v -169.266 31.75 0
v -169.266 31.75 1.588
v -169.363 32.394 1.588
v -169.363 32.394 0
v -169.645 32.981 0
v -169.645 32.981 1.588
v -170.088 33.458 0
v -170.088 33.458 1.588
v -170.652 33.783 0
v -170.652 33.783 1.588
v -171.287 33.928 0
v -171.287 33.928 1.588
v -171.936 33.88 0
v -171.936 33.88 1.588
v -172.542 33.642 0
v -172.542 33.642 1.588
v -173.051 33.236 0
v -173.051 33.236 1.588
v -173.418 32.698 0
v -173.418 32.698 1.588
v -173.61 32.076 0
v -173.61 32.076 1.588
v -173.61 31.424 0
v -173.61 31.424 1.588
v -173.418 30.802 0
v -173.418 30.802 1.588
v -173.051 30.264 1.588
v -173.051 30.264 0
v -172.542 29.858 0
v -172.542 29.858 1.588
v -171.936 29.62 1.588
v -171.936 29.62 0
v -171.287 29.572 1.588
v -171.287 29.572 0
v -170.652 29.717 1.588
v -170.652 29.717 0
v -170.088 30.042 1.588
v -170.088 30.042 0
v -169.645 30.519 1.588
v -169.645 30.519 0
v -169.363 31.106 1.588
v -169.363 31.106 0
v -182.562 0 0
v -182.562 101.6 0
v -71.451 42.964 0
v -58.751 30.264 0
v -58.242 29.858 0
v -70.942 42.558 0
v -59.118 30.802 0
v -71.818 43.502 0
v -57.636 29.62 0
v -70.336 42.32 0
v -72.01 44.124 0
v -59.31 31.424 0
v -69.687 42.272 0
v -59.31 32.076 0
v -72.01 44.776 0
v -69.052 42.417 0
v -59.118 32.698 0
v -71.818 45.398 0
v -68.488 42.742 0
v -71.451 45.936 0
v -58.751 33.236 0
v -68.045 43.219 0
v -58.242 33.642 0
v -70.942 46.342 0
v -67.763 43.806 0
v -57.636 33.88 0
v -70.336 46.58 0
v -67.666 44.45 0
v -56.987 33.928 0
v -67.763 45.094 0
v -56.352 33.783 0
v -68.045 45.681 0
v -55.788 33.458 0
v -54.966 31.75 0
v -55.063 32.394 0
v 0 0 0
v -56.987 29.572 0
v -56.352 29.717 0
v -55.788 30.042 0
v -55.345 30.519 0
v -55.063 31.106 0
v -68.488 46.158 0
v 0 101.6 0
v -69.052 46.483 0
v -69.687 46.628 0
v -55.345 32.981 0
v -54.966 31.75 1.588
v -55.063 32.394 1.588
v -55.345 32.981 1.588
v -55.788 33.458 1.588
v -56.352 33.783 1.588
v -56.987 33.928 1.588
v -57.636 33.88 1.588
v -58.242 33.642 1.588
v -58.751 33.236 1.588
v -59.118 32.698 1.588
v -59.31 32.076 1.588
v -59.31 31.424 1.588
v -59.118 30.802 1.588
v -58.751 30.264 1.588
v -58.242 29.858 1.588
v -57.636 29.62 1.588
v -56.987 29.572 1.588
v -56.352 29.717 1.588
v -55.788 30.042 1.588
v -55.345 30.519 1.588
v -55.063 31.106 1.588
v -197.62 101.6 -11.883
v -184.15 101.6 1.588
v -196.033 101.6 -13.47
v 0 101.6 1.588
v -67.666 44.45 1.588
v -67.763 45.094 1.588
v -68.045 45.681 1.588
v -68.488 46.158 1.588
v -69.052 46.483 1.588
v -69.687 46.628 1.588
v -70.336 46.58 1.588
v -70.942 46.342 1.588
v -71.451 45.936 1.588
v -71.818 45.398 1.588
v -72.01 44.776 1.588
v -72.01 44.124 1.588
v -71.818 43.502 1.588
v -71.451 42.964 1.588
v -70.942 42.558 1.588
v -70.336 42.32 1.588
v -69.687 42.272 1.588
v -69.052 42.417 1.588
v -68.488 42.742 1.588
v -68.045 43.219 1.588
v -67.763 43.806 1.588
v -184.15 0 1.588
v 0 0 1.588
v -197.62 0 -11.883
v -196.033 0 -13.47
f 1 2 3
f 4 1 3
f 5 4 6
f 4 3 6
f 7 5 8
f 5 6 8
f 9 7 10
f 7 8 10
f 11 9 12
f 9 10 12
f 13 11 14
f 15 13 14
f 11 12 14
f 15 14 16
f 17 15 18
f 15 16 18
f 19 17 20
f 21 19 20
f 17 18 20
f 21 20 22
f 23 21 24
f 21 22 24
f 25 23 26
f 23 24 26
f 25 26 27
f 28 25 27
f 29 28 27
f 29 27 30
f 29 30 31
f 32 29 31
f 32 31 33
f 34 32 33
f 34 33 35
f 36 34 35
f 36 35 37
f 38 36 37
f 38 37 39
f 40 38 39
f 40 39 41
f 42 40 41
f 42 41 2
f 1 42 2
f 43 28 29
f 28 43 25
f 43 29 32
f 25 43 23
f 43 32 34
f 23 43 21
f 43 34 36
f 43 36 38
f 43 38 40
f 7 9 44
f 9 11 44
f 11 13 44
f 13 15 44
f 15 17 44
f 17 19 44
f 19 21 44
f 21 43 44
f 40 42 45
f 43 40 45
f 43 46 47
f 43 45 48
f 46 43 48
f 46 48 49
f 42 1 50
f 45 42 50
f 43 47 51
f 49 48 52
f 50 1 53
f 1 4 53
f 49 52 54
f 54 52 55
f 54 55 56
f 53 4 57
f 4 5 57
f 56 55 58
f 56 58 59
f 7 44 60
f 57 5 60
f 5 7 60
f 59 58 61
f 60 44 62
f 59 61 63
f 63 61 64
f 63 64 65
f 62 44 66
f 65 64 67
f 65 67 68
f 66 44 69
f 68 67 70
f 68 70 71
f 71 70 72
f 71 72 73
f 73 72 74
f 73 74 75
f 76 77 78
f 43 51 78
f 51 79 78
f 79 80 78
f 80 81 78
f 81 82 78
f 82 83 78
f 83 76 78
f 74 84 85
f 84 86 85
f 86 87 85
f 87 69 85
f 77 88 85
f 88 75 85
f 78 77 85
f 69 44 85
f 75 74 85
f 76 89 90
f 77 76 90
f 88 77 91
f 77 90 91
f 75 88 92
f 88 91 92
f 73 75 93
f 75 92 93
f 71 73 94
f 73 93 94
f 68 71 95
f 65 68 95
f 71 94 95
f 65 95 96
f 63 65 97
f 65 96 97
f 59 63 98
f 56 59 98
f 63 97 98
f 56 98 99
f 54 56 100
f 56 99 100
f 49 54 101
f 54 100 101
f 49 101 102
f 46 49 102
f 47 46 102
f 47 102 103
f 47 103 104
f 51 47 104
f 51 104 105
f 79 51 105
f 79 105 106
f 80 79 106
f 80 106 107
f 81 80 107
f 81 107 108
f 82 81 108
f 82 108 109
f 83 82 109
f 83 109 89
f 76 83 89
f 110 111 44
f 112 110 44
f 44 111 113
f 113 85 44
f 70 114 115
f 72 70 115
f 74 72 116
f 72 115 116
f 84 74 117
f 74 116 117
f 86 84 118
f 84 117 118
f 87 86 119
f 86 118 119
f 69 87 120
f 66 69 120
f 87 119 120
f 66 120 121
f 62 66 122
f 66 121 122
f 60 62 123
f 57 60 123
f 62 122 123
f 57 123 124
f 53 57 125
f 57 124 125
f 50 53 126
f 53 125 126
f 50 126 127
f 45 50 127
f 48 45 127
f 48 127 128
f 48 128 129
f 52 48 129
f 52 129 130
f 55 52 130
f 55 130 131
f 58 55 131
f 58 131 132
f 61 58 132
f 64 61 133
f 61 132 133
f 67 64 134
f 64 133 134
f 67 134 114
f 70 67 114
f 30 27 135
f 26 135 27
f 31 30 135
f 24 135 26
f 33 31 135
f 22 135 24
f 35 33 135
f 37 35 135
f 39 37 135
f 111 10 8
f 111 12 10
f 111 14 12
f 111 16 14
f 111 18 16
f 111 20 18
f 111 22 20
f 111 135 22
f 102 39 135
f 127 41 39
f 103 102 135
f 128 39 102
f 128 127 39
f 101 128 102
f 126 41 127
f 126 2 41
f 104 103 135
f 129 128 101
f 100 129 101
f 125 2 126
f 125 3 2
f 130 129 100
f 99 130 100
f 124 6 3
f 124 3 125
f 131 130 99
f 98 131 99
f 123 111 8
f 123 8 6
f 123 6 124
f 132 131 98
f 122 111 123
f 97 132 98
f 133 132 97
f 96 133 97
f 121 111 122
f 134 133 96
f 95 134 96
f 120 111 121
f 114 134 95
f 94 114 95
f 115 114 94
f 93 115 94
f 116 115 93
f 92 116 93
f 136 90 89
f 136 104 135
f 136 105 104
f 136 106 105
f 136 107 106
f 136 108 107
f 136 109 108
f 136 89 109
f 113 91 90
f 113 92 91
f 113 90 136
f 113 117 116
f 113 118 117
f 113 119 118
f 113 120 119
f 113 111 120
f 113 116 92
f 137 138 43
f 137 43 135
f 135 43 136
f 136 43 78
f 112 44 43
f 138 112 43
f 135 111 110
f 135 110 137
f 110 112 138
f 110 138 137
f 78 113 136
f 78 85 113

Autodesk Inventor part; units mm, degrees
ref_plane "YZ Plane" through (0, 0, 0) normal (1, 0, 0) x (0, 1, 0)
ref_plane "XZ Plane" through (0, 0, 0) normal (0, 1, 0) x (-1, 0, 0)
ref_plane "XY Plane" through (0, 0, 0) normal (0, 0, 1) x (1, 0, 0)
sketch "Sketch1" plane through (0, 0, 0) normal (0, 0, 1) x (1, 0, 0)
  line L0 (0, 0) -> (-184.15, 0)
  line L1 (-184.15, 0) -> (-184.15, 101.6)
  line L2 (-184.15, 101.6) -> (0, 101.6)
  line L3 (0, 101.6) -> (0, 0)
  dimension "d0" = 184.15
  dimension "d1" = 101.6
extrude "Extrusion1" add sketch "Sketch1" along normal blind 1.5875
chamfer "Chamfer1" distance 1.5875 angle 45 1 edges at (-184.15, 50.8, 0)
sketch "Sketch2" plane through (-184.15, 0, 1.5875) normal (-0.7071, 0, -0.7071) x (-0.7071, 0, 0.7071)
  line L0 (0, 101.6) -> (0, 0) projected
  line L1 (-2.2451, 101.6) -> (-2.2451, 0) projected
  line L2 (0, 101.6) -> (-2.2451, 101.6) projected
  line L3 (-2.2451, 0) -> (0, 0) projected
  point P0 (-131.3362, 0)
extrude "Extrusion2" add sketch "Sketch2" along normal blind 19.05
sketch "Sketch3" plane through (0, 0, 1.5875) normal (0, 0, 1) x (1, 0, 0)
  circle A0 centre (-57.15, 31.75) radius 2.1844
  line L0 (-184.15, 0) -> (0, 0) projected
  line L1 (-184.15, 101.6) -> (-184.15, 0) projected
  circle A1 centre (-69.85, 44.45) radius 2.1844
  circle A2 centre (-171.45, 31.75) radius 2.1844
  point P0 (-231.8428, 57.2075)
  dimension "d9" = 4.3688
  dimension "d10" = 31.75
  dimension "d11" = 127
  dimension "d12" = 4.3688
  dimension "d13" = 44.45
  dimension "d14" = 114.3
  dimension "d17" = 4.3688
  dimension "d18" = 114.3
extrude "Extrusion3" cut sketch "Sketch3" against normal blind 19.05
properties part number "frontwing"
